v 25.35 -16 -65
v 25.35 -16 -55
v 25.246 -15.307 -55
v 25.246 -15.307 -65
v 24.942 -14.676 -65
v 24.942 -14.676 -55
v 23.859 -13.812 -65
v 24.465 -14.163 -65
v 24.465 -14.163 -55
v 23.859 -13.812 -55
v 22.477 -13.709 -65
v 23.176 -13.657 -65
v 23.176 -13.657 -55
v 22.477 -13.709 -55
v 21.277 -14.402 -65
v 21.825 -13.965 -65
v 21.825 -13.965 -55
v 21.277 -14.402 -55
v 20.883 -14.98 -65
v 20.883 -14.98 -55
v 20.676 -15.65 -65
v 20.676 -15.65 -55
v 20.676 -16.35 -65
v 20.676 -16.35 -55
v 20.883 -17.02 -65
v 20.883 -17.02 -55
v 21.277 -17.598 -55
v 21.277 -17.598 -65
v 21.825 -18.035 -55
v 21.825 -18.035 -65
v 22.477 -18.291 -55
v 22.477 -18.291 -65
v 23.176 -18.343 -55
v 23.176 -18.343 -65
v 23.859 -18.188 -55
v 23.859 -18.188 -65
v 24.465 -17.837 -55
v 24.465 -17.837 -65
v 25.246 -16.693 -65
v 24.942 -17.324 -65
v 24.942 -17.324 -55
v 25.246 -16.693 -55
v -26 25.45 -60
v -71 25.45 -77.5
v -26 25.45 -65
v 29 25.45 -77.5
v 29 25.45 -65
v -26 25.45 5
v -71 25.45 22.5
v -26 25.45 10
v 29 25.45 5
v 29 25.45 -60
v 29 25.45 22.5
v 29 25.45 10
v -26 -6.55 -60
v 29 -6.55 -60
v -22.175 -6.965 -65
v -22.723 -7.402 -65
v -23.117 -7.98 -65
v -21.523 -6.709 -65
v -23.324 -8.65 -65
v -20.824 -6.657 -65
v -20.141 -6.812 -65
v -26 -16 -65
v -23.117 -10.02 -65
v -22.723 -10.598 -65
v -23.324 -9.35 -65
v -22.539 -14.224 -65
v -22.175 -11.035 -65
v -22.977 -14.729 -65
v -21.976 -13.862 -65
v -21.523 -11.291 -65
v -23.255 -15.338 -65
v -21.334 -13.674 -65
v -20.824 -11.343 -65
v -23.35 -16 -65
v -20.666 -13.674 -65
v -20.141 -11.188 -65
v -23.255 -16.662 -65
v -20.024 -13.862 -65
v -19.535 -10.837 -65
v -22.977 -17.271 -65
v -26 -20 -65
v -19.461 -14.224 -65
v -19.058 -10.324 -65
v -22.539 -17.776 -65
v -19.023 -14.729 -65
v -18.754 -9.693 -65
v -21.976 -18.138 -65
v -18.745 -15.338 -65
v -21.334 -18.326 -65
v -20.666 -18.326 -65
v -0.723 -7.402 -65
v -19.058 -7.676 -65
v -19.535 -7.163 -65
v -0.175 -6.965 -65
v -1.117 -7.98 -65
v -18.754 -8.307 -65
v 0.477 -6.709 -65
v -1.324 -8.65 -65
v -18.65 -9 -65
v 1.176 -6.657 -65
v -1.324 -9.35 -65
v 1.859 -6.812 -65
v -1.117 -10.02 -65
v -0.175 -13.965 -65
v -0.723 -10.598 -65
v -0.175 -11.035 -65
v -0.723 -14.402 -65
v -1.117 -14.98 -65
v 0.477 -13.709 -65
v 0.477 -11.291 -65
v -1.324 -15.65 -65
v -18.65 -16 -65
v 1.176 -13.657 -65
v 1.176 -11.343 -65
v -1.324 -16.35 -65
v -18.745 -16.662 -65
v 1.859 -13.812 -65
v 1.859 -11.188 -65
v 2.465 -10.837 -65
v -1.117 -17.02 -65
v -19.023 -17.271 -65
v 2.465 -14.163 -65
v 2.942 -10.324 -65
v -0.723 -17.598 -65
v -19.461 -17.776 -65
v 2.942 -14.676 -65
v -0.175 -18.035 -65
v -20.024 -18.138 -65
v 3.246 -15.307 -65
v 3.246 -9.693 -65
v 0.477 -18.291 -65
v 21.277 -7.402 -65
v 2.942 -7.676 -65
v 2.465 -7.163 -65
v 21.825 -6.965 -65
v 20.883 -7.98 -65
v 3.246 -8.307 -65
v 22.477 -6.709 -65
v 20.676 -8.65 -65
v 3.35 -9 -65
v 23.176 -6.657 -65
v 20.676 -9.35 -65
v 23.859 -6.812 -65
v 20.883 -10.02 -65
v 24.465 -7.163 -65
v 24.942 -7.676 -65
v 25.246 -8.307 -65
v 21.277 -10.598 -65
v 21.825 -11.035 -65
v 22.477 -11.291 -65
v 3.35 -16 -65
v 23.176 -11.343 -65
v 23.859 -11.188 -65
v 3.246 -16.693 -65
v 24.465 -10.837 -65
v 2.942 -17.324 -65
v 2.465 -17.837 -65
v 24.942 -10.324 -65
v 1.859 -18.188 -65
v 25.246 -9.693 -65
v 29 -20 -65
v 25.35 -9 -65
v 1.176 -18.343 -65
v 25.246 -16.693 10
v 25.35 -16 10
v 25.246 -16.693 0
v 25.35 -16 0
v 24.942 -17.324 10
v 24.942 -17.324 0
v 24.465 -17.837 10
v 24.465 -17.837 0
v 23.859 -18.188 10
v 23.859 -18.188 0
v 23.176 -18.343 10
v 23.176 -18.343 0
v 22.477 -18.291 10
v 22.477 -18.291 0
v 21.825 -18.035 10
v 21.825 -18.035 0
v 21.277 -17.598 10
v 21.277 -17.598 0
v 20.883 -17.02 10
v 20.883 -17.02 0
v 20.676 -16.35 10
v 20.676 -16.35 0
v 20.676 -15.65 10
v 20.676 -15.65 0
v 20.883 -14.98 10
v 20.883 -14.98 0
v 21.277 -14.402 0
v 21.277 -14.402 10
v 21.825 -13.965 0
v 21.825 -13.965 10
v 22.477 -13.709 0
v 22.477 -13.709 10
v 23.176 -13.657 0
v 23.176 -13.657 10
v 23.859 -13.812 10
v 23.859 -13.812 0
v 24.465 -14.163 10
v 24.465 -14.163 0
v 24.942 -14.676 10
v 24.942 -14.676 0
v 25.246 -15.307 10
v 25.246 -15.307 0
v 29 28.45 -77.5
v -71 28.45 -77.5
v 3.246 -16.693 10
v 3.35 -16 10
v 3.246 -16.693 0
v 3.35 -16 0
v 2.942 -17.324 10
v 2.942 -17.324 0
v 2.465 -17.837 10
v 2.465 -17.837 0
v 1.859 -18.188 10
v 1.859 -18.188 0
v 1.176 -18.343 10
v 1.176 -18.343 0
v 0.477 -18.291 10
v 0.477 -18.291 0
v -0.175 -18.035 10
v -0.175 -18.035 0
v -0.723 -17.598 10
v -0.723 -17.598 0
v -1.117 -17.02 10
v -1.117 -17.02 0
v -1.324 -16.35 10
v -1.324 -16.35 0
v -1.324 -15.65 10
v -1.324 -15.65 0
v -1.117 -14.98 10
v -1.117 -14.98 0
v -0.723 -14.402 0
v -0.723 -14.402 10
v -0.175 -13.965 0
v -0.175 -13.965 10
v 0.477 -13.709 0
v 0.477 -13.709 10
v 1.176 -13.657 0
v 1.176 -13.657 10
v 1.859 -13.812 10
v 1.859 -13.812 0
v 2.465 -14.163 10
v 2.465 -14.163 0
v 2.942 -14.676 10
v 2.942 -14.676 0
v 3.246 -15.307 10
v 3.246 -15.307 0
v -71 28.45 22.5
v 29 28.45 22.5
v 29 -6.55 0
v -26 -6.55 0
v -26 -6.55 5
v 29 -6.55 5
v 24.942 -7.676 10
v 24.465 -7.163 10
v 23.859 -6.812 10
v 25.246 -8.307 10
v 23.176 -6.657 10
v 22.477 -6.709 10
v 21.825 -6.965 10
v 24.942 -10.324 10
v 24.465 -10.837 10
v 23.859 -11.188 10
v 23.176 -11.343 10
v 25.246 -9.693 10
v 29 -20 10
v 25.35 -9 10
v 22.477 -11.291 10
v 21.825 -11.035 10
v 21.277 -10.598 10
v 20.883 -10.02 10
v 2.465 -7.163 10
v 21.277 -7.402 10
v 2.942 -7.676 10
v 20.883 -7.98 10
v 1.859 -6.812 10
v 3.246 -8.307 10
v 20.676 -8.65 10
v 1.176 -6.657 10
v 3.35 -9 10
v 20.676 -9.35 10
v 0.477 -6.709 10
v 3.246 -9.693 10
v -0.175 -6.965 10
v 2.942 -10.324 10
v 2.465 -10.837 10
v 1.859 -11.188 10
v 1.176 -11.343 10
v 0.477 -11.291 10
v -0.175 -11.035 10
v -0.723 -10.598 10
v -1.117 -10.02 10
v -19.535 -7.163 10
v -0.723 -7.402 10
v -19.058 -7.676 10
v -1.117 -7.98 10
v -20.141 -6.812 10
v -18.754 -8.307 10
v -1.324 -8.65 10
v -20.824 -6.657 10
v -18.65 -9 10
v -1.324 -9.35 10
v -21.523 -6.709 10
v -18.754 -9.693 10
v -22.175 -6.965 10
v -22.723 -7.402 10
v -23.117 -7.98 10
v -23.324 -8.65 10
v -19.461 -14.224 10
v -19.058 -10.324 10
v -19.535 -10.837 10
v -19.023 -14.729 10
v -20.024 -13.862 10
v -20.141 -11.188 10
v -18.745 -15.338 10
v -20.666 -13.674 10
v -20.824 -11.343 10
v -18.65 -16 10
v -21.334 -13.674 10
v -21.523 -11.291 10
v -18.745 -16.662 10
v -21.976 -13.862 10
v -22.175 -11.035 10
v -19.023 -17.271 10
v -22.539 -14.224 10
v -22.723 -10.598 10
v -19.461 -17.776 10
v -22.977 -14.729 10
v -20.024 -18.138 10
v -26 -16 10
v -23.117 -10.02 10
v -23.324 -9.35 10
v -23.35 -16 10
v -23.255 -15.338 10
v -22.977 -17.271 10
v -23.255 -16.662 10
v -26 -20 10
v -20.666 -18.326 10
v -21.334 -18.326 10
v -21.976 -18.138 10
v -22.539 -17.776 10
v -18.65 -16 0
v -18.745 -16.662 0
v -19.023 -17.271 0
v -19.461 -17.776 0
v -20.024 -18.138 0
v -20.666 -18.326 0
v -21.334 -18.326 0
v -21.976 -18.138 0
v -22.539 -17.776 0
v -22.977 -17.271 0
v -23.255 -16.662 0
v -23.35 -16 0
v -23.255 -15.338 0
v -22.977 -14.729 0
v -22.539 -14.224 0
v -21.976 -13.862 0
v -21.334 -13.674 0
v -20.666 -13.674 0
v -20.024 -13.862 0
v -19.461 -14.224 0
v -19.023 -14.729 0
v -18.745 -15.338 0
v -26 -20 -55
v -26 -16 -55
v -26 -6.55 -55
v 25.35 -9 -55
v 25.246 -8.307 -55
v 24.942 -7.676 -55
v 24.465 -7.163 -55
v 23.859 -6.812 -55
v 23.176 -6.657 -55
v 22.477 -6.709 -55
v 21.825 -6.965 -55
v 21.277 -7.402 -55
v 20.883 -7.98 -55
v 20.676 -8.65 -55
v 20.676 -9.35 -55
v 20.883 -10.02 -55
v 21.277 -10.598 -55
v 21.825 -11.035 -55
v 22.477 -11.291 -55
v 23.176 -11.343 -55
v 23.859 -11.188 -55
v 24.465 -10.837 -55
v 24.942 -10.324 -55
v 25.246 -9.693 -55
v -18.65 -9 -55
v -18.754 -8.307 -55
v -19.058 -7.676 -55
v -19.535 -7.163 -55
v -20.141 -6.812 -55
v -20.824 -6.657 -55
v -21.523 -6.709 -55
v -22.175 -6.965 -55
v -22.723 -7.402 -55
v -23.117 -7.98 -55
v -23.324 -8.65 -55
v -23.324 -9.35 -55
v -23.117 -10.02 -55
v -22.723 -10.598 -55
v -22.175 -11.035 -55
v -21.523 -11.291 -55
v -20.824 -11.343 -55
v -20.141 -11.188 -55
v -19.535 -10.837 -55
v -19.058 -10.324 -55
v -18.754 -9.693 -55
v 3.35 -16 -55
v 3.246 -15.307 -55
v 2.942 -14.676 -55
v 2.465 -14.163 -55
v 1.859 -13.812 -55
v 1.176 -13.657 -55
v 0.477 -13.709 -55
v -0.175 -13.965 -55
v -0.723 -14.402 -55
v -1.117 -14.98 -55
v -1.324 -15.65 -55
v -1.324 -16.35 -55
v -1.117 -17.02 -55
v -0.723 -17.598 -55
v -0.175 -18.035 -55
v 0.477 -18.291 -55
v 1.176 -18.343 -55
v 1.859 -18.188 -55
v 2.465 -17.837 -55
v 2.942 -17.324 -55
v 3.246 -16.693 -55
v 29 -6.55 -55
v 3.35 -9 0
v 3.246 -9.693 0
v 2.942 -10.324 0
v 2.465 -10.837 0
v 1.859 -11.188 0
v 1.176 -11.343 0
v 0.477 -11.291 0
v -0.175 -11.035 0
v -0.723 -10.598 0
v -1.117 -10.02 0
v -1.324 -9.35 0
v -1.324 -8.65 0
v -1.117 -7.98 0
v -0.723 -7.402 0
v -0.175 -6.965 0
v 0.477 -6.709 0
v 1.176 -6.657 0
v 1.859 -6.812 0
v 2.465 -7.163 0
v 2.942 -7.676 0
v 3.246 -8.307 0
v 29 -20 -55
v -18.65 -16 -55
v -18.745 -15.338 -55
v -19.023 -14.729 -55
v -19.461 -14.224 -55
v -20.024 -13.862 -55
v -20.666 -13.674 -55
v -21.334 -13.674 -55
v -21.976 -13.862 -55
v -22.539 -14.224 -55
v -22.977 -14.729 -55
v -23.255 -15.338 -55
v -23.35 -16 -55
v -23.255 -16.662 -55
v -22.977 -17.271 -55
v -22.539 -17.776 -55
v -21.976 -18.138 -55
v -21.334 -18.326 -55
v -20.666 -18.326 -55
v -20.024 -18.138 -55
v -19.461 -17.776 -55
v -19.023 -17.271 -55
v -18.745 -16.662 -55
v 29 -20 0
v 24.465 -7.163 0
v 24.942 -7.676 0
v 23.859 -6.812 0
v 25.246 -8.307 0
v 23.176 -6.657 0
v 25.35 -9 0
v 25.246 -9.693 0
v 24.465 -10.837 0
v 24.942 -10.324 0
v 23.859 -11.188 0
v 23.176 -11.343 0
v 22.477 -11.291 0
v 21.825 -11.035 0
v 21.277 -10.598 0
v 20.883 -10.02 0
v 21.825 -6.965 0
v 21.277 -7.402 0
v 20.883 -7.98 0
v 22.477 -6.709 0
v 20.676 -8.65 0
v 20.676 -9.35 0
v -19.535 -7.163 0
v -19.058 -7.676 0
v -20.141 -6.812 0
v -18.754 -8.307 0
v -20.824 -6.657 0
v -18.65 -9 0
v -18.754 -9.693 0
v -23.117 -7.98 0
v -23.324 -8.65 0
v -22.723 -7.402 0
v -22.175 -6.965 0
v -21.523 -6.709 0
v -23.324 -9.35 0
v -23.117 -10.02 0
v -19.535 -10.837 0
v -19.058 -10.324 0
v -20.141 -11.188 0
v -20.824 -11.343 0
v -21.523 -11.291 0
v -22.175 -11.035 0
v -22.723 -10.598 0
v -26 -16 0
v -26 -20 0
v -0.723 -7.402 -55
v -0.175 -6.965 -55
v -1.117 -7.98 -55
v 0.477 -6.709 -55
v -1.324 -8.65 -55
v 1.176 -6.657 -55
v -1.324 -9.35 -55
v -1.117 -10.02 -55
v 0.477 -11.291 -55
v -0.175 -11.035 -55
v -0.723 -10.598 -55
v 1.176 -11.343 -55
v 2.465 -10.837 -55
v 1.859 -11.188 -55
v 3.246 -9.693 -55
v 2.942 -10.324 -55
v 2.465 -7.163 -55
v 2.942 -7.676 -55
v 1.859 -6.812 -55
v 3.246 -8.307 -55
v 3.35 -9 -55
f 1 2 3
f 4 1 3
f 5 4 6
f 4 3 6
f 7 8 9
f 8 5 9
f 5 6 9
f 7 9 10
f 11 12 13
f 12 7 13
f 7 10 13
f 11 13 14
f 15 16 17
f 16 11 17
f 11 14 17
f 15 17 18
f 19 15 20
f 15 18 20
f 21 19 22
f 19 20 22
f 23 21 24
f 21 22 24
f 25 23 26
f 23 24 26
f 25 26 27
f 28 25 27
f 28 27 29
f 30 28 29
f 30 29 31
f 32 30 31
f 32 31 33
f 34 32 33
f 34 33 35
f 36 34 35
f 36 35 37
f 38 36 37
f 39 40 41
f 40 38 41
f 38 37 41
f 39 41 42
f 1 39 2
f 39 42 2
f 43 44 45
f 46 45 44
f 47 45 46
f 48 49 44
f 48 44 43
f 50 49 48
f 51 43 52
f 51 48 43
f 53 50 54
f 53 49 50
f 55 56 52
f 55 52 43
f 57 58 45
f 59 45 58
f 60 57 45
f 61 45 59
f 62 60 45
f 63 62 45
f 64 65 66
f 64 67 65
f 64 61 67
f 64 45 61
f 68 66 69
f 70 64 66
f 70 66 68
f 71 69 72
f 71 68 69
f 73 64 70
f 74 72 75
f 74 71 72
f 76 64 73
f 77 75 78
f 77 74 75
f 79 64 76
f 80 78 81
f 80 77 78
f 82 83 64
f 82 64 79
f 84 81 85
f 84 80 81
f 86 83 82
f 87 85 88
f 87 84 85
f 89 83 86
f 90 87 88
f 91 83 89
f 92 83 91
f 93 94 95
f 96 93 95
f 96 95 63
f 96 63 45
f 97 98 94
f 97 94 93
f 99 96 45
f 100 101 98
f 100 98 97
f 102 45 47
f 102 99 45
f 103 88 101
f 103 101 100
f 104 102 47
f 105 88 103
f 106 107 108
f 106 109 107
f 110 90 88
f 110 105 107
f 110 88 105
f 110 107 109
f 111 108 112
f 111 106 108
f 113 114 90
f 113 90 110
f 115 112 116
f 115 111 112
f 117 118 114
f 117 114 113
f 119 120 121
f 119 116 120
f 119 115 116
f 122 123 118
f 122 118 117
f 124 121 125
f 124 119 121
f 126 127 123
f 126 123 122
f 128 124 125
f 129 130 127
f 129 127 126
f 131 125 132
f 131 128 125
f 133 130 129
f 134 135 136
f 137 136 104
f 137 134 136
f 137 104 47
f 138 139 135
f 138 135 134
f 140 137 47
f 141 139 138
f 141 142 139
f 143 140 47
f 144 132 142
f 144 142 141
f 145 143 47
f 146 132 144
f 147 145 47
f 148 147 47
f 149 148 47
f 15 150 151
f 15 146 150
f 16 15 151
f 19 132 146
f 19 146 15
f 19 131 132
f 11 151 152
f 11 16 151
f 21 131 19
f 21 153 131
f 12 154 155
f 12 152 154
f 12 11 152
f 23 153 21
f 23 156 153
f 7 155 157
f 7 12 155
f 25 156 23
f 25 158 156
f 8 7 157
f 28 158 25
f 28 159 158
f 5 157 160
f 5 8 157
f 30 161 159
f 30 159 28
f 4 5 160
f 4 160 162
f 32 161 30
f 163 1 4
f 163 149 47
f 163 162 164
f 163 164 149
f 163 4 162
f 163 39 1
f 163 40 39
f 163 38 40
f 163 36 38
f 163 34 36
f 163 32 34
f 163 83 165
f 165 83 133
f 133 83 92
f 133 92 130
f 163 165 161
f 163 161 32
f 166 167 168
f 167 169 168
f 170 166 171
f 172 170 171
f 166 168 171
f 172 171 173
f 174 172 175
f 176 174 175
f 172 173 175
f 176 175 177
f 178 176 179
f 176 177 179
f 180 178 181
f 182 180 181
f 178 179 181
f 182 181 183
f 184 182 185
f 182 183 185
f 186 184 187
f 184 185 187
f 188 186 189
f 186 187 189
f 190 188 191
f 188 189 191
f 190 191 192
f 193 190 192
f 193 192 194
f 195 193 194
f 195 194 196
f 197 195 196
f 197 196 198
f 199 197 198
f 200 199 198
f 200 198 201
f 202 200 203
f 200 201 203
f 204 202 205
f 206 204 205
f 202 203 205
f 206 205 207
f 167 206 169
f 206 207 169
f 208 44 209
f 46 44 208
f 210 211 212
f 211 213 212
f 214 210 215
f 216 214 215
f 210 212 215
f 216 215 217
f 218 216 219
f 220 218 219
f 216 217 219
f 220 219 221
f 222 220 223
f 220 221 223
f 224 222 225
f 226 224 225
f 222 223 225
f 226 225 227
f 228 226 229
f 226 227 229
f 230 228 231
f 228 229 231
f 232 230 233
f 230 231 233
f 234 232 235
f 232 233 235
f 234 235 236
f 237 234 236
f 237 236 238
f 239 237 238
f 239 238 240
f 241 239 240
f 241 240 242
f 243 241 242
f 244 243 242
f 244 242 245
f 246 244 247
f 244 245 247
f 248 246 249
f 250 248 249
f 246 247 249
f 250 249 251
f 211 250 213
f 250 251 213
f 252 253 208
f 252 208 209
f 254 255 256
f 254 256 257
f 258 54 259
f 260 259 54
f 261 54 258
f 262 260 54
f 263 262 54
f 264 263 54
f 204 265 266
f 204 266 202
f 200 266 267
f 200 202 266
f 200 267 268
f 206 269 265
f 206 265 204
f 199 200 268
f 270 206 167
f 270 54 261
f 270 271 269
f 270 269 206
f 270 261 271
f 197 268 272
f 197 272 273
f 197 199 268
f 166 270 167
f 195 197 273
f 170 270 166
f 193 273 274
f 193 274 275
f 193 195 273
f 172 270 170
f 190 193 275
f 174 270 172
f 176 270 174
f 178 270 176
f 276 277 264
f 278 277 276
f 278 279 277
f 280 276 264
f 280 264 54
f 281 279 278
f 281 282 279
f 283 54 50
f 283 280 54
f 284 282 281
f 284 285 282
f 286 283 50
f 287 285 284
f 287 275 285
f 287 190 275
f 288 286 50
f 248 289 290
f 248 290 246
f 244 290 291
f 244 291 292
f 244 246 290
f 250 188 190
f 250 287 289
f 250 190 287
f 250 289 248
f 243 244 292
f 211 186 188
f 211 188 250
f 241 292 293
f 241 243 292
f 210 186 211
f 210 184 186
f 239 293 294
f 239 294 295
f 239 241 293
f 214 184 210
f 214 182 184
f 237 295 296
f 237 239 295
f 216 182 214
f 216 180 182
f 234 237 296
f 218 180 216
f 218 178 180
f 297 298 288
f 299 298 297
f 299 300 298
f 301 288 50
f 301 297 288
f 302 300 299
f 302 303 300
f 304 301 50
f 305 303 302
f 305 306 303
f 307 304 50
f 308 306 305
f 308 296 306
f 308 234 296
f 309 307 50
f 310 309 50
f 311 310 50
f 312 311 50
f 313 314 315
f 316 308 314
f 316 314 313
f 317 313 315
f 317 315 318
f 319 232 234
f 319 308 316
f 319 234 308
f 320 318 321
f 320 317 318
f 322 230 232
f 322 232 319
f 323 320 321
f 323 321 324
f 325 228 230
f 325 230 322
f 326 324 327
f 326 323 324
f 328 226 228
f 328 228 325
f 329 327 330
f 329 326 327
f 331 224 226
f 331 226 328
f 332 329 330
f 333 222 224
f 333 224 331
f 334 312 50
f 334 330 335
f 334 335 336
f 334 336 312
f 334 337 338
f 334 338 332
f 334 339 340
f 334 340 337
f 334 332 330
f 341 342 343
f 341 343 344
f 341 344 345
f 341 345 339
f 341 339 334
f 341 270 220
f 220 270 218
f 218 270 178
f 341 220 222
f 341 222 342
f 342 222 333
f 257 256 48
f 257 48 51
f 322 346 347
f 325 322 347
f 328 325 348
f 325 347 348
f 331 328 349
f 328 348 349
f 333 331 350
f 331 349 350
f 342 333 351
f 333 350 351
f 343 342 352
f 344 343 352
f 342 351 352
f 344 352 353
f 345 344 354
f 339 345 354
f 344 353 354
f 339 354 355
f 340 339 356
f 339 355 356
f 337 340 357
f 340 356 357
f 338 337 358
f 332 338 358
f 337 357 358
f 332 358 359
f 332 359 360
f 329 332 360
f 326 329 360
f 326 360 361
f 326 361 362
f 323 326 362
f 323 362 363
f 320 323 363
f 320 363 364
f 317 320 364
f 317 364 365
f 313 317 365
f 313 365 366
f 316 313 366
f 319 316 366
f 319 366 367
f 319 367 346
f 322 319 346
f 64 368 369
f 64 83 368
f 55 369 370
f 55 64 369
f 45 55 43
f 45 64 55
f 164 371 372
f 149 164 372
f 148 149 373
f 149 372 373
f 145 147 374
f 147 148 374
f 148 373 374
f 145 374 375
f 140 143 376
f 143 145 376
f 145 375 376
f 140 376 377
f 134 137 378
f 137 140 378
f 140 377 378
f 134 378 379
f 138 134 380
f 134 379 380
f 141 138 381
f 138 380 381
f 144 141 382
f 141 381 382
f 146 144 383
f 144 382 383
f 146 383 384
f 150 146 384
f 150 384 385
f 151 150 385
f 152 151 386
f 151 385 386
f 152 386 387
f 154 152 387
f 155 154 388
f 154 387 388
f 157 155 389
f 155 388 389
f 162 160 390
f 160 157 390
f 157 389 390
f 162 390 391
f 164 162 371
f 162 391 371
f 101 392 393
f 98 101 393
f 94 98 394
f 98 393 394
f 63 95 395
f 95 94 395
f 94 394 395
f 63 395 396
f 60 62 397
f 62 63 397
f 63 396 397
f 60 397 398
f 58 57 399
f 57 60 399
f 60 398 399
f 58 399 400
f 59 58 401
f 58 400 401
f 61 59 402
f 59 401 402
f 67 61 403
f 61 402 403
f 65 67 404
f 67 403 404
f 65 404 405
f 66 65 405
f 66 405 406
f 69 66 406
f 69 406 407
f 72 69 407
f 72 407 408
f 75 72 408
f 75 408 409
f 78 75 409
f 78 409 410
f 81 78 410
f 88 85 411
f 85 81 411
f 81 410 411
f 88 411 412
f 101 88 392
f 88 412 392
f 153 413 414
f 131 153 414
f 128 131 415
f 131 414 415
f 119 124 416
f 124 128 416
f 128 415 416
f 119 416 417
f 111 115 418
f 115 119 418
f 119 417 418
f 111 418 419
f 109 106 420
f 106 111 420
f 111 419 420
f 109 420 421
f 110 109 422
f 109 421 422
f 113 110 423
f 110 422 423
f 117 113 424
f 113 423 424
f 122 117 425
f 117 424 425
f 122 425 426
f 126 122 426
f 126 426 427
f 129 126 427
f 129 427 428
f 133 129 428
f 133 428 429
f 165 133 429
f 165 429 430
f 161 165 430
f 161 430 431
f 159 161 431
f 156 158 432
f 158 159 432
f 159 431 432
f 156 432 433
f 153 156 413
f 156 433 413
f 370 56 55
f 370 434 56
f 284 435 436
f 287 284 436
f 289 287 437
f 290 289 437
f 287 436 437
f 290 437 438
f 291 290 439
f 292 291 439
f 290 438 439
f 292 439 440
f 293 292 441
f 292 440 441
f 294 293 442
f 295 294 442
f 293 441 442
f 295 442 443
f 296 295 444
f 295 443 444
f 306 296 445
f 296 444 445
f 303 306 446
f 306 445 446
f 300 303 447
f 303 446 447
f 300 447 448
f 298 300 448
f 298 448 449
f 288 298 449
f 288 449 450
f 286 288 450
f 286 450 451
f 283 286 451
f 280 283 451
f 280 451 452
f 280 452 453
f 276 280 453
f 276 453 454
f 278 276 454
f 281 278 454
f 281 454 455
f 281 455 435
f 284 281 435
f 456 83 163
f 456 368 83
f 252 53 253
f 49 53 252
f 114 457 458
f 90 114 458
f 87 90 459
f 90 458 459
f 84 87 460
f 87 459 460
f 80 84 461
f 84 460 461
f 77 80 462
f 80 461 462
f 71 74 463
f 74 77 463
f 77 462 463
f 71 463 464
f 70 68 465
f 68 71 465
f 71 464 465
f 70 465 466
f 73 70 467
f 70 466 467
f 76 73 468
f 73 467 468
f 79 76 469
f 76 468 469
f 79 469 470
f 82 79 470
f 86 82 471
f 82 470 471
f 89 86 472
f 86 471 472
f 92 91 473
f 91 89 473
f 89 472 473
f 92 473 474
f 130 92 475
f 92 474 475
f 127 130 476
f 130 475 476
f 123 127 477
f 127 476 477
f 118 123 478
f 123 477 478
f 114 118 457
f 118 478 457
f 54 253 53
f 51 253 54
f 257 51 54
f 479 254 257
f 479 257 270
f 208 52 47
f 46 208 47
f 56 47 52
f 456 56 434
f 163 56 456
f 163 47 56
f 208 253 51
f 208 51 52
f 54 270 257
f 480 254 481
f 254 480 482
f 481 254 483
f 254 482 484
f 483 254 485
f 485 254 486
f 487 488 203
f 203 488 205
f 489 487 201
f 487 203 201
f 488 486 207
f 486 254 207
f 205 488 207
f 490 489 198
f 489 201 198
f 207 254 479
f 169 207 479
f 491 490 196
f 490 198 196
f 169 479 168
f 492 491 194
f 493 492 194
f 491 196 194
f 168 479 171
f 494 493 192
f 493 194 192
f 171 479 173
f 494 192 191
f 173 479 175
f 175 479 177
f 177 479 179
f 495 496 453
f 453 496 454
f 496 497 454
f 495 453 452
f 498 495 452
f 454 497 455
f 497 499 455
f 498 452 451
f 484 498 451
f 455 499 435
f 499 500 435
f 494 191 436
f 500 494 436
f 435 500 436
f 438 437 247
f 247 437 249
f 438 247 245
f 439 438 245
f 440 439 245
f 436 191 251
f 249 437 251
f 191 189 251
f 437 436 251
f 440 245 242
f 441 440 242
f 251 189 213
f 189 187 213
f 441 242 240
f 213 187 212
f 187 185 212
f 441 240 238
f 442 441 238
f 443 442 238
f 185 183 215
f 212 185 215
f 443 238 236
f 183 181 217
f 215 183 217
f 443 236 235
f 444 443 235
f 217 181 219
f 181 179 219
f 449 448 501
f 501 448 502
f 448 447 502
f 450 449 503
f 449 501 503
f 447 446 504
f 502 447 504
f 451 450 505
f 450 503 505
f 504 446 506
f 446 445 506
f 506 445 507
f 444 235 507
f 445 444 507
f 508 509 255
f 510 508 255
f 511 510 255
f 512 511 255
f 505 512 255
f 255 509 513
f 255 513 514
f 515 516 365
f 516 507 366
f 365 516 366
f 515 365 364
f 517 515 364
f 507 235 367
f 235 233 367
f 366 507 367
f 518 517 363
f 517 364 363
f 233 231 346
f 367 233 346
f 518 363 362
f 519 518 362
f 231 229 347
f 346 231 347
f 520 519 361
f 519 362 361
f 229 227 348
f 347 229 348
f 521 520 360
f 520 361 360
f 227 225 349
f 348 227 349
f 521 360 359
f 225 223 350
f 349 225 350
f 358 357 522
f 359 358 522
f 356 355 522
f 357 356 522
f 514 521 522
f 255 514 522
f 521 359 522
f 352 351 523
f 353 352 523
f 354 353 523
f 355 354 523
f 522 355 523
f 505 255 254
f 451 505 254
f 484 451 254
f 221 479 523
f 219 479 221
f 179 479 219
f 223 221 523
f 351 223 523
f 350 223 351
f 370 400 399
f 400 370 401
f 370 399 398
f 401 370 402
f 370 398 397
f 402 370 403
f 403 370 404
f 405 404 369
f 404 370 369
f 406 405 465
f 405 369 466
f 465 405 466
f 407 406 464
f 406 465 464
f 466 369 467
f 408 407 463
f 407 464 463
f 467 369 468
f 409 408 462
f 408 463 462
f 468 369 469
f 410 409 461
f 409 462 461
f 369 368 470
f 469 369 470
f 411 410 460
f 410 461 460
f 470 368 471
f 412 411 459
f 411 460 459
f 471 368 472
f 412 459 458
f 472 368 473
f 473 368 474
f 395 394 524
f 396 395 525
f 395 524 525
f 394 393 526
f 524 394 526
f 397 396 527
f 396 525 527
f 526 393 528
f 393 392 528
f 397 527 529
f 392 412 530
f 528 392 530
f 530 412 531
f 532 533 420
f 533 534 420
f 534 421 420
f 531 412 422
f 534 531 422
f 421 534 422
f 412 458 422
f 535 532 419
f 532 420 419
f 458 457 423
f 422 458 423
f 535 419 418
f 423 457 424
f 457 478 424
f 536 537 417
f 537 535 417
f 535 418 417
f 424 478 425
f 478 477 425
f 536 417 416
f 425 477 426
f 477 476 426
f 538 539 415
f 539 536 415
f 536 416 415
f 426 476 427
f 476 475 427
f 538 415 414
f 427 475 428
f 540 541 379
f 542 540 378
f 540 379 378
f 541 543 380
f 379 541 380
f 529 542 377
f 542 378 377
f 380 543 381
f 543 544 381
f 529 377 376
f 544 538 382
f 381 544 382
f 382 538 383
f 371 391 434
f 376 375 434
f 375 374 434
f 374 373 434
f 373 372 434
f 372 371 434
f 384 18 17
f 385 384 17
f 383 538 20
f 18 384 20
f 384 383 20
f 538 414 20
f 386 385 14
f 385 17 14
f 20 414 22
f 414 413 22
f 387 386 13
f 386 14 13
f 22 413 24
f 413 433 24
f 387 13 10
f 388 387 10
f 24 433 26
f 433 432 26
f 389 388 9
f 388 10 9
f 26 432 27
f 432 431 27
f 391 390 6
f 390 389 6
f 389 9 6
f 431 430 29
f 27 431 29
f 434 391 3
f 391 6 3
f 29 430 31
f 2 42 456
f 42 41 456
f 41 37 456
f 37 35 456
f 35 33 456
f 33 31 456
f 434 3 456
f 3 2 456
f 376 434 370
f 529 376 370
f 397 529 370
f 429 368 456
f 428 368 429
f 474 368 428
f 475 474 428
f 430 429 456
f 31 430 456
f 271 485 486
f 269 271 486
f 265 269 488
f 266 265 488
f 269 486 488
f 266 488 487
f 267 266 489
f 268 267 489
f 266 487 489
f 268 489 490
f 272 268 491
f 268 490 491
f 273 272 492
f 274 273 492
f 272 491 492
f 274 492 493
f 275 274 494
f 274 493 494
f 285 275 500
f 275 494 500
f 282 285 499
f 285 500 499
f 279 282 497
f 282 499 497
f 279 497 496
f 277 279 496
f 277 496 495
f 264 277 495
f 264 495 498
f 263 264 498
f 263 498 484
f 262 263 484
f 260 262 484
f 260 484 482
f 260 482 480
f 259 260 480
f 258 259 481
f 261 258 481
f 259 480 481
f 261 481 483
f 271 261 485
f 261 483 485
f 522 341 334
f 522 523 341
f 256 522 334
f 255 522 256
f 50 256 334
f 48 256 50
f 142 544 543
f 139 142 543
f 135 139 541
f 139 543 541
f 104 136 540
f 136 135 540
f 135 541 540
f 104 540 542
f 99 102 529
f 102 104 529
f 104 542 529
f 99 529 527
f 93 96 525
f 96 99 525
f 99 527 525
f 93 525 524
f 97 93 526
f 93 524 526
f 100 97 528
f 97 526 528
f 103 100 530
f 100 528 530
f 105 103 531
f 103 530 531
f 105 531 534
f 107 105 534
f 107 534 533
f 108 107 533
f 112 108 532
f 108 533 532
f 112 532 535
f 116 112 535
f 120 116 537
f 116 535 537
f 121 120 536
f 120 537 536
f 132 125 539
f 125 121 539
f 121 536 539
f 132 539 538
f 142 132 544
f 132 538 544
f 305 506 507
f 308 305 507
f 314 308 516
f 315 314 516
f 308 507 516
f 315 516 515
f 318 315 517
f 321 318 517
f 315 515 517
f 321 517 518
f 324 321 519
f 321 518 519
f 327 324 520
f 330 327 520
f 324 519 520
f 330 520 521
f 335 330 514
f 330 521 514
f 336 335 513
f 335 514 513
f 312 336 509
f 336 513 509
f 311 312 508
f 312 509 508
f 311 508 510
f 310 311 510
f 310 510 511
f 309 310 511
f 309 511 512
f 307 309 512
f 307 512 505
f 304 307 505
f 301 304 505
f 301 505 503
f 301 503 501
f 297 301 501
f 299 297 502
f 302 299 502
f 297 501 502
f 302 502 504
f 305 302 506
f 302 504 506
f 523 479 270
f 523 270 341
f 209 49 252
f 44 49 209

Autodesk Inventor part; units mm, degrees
ref_plane "YZ Plane" through (0, 0, 0) normal (1, 0, 0) x (0, 1, 0)
ref_plane "XZ Plane" through (0, 0, 0) normal (0, 1, 0) x (-1, 0, 0)
ref_plane "Work Plane1" through (0, 0, -55) normal (0, 0, -1) x (1, 0, 0)
sketch "Sketch2" plane through (0, 0, -55) normal (0, 0, -1) x (1, 0, 0)
  circle A0 centre (23, 9) radius 2.35 projected
  circle A1 centre (1, 9) radius 2.35 projected
  circle A2 centre (-21, 9) radius 2.35 projected
  circle A3 centre (-21, 16) radius 2.35 projected
  circle A4 centre (1, 16) radius 2.35 projected
  circle A5 centre (23, 16) radius 2.35 projected
  circle A6 centre (-66, 12.5) radius 1.6 projected
  circle A7 centre (63, 29.65) radius 1.6 projected
  arc A8 (58.9857, 35) -> (49.7248, 32.4349) centre (58.9857, 17) ccw projected
  line L0 (33.2752, 22.5651) -> (49.7248, 32.4349) projected
  arc A9 (24.0143, 20) -> (33.2752, 22.5651) centre (24.0143, 38) ccw projected
  line L1 (-71, 20) -> (24.0143, 20) projected
  arc A10 (-71, 20) -> (-81, 10) centre (-71, 10) ccw projected
  line L2 (-81, 6.5495) -> (-81, 10) projected
  line L3 (-80.0877, 6.5495) -> (-81, 6.5495) projected
  line L4 (81, 6.5495) -> (-80.0877, 6.5495) projected
  line L5 (81, 20) -> (81, 6.5495) projected
  arc A11 (81, 20) -> (66, 35) centre (66, 20) ccw projected
  line L6 (58.9857, 35) -> (66, 35) projected
  line L7 (-21, 16) -> (-26, 16)
  line L8 (-21, 16) -> (-16, 16) construction
  line L9 (-26, 16) -> (-26, 20)
  line L10 (-26, 20) -> (29, 20)
  line L11 (29, 20) -> (29, 6.5495)
  line L12 (29, 6.5495) -> (-26, 6.5495)
  line L13 (-26, 6.5495) -> (-26, 20)
  point P0 (0, 0)
  dimension "d0" = 5
  dimension "d1" = 180
  dimension "d2" = 55
extrude "Extrusion1" add sketch "Sketch2" along normal blind 10 contours L9 L1 L10 L11 L4 L13
sketch "Sketch3" plane through (-26, -6.5495, -55) normal (0, 1, 0) x (1, 0, 0)
  line L0 (0, 0) -> (0, 10) projected
  line L1 (0, 10) -> (55, 10)
  line L2 (55, 10) -> (55, 5)
  line L3 (55, 5) -> (0, 5)
  line L4 (0, 5) -> (0, 10)
  point P0 (26, -55)
  dimension "d5" = 55
  dimension "d6" = 5
extrude "Extrusion2" add sketch "Sketch3" along normal blind 35
sketch "Sketch4" plane through (-26, -6.5495, -60) normal (0, 0, 1) x (1, 0, 0)
  line L0 (0, -13.4505) -> (0, 35) projected
  line L1 (0, 35) -> (55, 35)
  line L2 (55, 35) -> (55, 32)
  line L3 (55, 32) -> (0, 32)
  line L4 (0, 32) -> (0, 35)
  point P0 (26, 6.5495)
  dimension "d9" = 55
  dimension "d10" = 3
ref_plane "Work Plane2" through (-91.43, -48.7723, -27.5) normal (0, 0, 1) x (1, 0, 0)
extrude "Extrusion3" add sketch "Sketch4" along normal up to surface (32.5 mm away)
ref_plane "Work Plane3" through (-26, -6.5495, -27.5) normal (0, 0, 1) x (1, 0, 0)
mirror "Mirror1" about plane through (-26, -6.5495, -27.5) normal (0, 0, 1) of "Extrusion3", "Extrusion2", "Extrusion1"
ref_plane "Work Plane4" through (-26, 25.4505, -55) normal (0, 1, 0) x (1, 0, 0)
sketch "Sketch5" plane through (-26, 25.4505, -55) normal (0, 1, 0) x (1, 0, 0)
  line L0 (55, 5) -> (55, -60) projected
  line L1 (55, -27.5) -> (55, -77.5)
  line L2 (55, -27.5) -> (105, -27.5) construction
  line L3 (55, -77.5) -> (-45, -77.5)
  line L4 (-45, -77.5) -> (-45, 22.5)
  line L5 (-45, 22.5) -> (55, 22.5)
  line L6 (55, 22.5) -> (55, -77.5)
  point P0 (26, -55)
  dimension "d15" = 50
  dimension "d16" = 90
  dimension "d17" = 100
  dimension "d18" = 100
extrude "Extrusion4" add sketch "Sketch5" along normal blind 3
